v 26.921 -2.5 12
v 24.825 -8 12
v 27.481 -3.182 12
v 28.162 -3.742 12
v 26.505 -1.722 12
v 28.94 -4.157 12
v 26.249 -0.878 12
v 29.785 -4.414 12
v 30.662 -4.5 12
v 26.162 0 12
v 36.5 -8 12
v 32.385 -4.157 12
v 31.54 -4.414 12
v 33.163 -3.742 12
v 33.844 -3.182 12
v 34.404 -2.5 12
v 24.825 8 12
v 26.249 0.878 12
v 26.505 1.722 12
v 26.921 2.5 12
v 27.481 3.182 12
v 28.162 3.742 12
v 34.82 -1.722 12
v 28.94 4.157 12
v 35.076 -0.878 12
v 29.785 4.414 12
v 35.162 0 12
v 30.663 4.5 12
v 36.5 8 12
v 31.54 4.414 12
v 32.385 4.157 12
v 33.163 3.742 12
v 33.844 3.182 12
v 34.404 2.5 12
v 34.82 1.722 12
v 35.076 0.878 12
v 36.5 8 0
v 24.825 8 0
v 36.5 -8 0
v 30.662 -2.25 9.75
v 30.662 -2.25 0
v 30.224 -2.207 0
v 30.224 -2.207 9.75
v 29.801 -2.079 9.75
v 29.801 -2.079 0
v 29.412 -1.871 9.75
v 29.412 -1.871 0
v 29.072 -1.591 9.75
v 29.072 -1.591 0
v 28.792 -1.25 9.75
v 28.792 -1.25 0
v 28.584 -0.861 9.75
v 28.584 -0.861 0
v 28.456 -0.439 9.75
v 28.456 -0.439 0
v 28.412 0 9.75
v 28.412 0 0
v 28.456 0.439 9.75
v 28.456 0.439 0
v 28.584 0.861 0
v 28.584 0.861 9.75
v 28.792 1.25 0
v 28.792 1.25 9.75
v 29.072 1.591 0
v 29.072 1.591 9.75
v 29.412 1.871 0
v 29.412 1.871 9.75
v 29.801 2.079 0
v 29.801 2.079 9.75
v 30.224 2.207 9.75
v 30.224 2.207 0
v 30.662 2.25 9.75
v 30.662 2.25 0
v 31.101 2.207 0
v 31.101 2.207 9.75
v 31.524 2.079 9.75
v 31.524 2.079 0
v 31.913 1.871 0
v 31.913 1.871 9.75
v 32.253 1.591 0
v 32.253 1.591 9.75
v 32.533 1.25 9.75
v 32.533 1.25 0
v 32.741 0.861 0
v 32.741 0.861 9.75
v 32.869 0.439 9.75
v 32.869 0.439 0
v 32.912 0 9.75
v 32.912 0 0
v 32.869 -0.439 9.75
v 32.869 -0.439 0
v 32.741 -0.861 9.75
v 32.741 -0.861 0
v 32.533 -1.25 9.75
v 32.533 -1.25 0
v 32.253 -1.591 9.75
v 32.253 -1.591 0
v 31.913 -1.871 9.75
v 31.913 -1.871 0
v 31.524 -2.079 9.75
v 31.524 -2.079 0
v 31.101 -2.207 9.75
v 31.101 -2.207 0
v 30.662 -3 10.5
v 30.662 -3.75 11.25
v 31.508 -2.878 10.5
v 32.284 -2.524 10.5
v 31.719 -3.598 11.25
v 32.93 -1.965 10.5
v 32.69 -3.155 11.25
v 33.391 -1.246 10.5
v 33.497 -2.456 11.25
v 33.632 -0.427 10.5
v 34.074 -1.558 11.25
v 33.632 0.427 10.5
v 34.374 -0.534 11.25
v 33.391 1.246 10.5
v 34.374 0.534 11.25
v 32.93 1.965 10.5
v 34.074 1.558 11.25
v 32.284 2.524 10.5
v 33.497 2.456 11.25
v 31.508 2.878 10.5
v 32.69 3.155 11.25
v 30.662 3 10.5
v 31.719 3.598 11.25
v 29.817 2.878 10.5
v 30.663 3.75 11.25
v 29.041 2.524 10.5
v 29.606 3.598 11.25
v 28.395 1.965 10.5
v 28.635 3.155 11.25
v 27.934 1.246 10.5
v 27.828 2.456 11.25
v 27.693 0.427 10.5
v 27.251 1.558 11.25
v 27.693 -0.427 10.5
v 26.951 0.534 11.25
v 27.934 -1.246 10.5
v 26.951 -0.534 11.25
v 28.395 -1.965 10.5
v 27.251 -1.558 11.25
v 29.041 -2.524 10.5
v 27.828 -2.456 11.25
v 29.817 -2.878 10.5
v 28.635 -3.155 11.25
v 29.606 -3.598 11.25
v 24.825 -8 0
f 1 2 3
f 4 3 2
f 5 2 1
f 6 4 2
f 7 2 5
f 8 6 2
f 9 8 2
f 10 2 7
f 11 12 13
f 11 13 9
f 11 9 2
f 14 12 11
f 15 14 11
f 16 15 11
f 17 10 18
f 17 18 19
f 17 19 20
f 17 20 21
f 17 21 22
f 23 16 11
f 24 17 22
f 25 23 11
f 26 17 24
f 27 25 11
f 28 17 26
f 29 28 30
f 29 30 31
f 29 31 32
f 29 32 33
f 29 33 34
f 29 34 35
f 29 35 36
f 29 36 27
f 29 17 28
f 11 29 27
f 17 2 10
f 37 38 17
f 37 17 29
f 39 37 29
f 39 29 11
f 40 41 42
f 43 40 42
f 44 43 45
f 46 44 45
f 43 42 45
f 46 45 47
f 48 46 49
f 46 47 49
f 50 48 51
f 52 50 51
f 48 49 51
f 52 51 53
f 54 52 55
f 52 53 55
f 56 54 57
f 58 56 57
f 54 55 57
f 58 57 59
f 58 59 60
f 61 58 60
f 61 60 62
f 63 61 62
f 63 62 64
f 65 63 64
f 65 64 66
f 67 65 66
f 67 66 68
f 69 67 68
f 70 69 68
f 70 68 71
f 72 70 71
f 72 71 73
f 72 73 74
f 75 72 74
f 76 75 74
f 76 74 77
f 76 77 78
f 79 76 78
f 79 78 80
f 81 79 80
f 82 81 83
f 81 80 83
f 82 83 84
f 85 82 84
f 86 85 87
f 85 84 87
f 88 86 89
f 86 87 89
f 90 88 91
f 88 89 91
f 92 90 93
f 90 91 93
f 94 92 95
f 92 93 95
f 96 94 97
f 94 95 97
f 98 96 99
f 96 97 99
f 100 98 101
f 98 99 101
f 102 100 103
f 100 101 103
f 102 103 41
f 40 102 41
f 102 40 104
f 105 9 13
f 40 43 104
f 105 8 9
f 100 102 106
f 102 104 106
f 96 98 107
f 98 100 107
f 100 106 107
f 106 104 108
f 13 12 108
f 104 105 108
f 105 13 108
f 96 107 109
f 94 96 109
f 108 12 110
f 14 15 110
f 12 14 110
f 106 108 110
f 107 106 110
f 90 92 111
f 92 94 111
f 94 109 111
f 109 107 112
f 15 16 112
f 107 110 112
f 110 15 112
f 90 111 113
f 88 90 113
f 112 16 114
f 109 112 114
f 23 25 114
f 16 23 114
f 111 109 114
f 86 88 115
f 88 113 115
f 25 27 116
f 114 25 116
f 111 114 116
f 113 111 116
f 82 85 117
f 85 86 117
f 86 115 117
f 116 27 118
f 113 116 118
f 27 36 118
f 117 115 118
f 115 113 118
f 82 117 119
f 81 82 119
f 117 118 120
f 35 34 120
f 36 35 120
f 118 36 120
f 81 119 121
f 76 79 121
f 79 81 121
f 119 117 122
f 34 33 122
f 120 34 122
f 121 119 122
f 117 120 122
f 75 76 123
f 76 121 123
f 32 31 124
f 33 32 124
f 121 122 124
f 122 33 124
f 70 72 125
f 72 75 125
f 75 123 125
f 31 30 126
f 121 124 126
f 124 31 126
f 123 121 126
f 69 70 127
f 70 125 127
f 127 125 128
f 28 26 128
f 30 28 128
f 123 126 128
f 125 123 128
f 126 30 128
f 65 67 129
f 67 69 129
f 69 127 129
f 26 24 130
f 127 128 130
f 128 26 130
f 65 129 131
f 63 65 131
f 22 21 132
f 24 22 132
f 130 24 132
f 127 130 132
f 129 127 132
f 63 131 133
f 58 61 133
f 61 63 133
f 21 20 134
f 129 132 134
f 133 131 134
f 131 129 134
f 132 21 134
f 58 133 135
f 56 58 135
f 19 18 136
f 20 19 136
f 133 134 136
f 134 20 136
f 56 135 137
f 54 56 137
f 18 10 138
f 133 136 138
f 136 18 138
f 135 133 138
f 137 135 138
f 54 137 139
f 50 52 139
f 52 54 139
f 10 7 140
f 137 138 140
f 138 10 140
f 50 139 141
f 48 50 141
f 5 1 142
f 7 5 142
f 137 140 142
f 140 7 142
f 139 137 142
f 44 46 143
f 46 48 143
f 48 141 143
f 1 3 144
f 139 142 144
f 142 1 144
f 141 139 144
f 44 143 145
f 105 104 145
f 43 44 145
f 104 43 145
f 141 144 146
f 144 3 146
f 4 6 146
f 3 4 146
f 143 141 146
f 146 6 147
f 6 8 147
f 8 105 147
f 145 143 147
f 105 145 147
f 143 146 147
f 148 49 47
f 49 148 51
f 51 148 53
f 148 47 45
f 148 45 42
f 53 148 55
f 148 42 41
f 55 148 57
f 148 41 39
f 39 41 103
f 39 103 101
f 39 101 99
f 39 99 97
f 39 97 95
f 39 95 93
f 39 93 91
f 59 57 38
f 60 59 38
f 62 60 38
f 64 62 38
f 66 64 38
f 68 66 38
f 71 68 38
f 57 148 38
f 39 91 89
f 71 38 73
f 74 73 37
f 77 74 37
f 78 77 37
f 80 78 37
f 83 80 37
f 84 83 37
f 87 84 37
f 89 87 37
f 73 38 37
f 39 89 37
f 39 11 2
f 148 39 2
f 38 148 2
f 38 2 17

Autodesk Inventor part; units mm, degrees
ref_plane "YZ Plane" through (0, 0, 0) normal (1, 0, 0) x (0, 1, 0)
ref_plane "XZ Plane" through (0, 0, 0) normal (0, 1, 0) x (-1, 0, 0)
ref_plane "XY Plane" through (0, 0, 0) normal (0, 0, 1) x (1, 0, 0)
sketch "Sketch1" plane through (0, 0, 0) normal (0, 0, 1) x (1, 0, 0)
  line L0 (23.825, 8.05) -> (23.825, -8.05) construction
  line L1 (37, 8.05) -> (31.3417, 8.05) construction
  line L2 (31.3417, -8.05) -> (37, -8.05) construction
  line L3 (37, 8.05) -> (23.825, 8.05) construction
  line L4 (23.825, 8.05) -> (23.825, -8.05) construction
  line L5 (23.825, -8.05) -> (37, -8.05) construction
  line L6 (37, -8.05) -> (37, 8.05) construction
  circle A0 centre (30.6625, 0) radius 2.067 construction
  line L7 (36.5, -8) -> (24.825, -8)
  line L8 (24.825, -8) -> (24.825, 8)
  line L9 (24.825, 8) -> (36.5, 8)
  line L10 (36.5, 8) -> (36.5, -8)
  line L11 (36.5, -8) -> (24.825, 8) construction
  line L12 (24.825, -8) -> (36.5, 8) construction
  point P0 (0, 0)
  dimension "d0" = 1
  dimension "d1" = 0.05
  dimension "d11" = 11.675
  dimension "d12" = 16
extrude "Extrusion1" add sketch "Sketch1" along normal blind 12
sketch "Sketch2" plane through (0, 0, 12) normal (0, 0, 1) x (1, 0, 0)
  point P0 (0, 0)
  point P1 (30.6625, 0)
hole "Hole1" at (30.6625, 0, 12) direction (0, 0, -1) diameter 4.5 end through all countersink diameter 9 countersink angle 90
properties part number "TH1-002" material "Steel, Mild"
